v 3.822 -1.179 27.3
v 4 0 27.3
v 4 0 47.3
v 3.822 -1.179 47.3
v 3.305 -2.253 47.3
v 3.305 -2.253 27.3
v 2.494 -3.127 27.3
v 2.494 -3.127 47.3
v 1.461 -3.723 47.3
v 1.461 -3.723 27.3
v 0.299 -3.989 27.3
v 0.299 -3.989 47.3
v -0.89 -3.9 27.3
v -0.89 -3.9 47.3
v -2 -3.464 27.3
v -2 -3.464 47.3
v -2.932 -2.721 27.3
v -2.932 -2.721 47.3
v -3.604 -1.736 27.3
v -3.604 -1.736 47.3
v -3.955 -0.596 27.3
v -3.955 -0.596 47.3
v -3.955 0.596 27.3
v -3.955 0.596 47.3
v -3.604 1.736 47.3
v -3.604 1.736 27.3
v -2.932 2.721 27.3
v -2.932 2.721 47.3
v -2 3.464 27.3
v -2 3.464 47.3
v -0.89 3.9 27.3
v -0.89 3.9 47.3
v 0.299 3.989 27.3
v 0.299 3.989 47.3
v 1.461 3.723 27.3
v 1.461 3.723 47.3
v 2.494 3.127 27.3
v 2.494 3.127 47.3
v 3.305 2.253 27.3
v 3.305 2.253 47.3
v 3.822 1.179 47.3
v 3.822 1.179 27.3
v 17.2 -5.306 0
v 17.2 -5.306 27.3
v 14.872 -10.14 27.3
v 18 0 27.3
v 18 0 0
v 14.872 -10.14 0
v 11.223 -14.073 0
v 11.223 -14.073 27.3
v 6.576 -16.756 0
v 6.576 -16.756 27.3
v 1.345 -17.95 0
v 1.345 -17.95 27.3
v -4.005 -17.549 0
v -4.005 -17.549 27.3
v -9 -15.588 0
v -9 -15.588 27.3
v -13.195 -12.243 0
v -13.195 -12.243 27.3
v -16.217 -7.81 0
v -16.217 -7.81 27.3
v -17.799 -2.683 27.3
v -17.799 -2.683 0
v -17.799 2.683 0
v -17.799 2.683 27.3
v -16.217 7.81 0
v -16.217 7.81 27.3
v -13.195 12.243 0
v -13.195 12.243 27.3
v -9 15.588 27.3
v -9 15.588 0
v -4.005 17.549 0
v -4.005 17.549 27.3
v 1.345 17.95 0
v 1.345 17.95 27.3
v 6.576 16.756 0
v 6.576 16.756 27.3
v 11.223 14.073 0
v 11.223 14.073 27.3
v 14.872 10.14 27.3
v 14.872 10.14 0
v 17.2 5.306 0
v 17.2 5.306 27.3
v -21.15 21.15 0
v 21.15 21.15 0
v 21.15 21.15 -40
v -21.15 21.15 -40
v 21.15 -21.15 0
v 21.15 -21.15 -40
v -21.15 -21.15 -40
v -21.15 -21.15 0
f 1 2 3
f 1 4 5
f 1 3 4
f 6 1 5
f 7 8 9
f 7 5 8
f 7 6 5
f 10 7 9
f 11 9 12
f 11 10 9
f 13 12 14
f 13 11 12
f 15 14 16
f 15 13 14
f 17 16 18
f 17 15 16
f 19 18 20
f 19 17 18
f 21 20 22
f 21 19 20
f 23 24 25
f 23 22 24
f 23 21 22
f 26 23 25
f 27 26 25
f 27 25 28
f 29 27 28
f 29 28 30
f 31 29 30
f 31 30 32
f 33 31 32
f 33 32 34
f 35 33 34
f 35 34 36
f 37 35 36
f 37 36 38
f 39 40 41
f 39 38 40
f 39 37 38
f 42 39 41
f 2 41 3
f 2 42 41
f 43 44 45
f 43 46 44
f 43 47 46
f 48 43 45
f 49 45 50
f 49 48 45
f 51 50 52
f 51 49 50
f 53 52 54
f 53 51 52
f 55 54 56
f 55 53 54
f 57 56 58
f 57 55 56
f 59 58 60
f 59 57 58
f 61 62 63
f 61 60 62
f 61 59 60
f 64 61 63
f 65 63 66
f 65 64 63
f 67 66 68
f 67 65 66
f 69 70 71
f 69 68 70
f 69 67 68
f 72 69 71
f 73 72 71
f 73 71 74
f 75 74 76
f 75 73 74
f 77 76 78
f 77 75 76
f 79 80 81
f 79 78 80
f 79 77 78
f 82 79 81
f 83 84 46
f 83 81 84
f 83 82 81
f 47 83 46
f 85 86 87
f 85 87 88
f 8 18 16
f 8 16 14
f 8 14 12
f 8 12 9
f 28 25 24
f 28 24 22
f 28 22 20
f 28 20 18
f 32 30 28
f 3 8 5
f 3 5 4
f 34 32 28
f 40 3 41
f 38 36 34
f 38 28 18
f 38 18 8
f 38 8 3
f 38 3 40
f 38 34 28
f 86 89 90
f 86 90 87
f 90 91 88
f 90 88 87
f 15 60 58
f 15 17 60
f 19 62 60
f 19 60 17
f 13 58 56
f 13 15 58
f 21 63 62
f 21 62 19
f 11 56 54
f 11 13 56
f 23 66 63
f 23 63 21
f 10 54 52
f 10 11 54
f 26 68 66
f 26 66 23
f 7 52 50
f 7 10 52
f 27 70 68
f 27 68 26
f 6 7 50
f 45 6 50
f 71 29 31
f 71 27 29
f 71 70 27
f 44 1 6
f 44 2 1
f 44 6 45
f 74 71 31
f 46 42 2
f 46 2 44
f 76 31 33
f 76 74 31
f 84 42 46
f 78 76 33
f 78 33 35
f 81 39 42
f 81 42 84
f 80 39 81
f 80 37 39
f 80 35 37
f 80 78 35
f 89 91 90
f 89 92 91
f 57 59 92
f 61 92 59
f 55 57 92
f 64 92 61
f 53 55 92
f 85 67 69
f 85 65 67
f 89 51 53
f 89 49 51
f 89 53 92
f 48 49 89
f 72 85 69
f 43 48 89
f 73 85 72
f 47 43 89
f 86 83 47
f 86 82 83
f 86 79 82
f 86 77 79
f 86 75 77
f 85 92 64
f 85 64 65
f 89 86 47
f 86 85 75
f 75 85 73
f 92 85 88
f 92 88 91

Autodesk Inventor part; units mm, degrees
ref_plane "YZ Plane" through (0, 0, 0) normal (1, 0, 0) x (0, 1, 0)
ref_plane "XZ Plane" through (0, 0, 0) normal (0, 1, 0) x (-1, 0, 0)
ref_plane "XY Plane" through (0, 0, 0) normal (0, 0, 1) x (1, 0, 0)
sketch "Sketch1" plane through (0, 0, 0) normal (0, 0, 1) x (1, 0, 0)
  line L0 (-21.15, -21.15) -> (21.15, -21.15)
  line L1 (21.15, -21.15) -> (21.15, 21.15)
  line L2 (21.15, 21.15) -> (-21.15, 21.15)
  line L3 (-21.15, 21.15) -> (-21.15, -21.15)
  line L4 (-21.15, -21.15) -> (21.15, 21.15) construction
  line L5 (21.15, -21.15) -> (-21.15, 21.15) construction
  circle A0 centre (0, 0) radius 18
  dimension "d0" = 42.3
  dimension "d1" = 42.3
  dimension "d2" = 36
extrude "Extrusion1" add sketch "Sketch1" against normal blind 40 contours L3 L2 L1 L0 | A0
extrude "Extrusion2" add sketch "Sketch1" along normal blind 27.3 contours A0
sketch "Sketch2" plane through (0, 0, 27.3) normal (0, 0, 1) x (1, 0, 0)
  circle A0 centre (0, 0) radius 4
  dimension "d7" = 8
extrude "Extrusion3" add sketch "Sketch2" along normal blind 20
properties part number "gearedNema17"
